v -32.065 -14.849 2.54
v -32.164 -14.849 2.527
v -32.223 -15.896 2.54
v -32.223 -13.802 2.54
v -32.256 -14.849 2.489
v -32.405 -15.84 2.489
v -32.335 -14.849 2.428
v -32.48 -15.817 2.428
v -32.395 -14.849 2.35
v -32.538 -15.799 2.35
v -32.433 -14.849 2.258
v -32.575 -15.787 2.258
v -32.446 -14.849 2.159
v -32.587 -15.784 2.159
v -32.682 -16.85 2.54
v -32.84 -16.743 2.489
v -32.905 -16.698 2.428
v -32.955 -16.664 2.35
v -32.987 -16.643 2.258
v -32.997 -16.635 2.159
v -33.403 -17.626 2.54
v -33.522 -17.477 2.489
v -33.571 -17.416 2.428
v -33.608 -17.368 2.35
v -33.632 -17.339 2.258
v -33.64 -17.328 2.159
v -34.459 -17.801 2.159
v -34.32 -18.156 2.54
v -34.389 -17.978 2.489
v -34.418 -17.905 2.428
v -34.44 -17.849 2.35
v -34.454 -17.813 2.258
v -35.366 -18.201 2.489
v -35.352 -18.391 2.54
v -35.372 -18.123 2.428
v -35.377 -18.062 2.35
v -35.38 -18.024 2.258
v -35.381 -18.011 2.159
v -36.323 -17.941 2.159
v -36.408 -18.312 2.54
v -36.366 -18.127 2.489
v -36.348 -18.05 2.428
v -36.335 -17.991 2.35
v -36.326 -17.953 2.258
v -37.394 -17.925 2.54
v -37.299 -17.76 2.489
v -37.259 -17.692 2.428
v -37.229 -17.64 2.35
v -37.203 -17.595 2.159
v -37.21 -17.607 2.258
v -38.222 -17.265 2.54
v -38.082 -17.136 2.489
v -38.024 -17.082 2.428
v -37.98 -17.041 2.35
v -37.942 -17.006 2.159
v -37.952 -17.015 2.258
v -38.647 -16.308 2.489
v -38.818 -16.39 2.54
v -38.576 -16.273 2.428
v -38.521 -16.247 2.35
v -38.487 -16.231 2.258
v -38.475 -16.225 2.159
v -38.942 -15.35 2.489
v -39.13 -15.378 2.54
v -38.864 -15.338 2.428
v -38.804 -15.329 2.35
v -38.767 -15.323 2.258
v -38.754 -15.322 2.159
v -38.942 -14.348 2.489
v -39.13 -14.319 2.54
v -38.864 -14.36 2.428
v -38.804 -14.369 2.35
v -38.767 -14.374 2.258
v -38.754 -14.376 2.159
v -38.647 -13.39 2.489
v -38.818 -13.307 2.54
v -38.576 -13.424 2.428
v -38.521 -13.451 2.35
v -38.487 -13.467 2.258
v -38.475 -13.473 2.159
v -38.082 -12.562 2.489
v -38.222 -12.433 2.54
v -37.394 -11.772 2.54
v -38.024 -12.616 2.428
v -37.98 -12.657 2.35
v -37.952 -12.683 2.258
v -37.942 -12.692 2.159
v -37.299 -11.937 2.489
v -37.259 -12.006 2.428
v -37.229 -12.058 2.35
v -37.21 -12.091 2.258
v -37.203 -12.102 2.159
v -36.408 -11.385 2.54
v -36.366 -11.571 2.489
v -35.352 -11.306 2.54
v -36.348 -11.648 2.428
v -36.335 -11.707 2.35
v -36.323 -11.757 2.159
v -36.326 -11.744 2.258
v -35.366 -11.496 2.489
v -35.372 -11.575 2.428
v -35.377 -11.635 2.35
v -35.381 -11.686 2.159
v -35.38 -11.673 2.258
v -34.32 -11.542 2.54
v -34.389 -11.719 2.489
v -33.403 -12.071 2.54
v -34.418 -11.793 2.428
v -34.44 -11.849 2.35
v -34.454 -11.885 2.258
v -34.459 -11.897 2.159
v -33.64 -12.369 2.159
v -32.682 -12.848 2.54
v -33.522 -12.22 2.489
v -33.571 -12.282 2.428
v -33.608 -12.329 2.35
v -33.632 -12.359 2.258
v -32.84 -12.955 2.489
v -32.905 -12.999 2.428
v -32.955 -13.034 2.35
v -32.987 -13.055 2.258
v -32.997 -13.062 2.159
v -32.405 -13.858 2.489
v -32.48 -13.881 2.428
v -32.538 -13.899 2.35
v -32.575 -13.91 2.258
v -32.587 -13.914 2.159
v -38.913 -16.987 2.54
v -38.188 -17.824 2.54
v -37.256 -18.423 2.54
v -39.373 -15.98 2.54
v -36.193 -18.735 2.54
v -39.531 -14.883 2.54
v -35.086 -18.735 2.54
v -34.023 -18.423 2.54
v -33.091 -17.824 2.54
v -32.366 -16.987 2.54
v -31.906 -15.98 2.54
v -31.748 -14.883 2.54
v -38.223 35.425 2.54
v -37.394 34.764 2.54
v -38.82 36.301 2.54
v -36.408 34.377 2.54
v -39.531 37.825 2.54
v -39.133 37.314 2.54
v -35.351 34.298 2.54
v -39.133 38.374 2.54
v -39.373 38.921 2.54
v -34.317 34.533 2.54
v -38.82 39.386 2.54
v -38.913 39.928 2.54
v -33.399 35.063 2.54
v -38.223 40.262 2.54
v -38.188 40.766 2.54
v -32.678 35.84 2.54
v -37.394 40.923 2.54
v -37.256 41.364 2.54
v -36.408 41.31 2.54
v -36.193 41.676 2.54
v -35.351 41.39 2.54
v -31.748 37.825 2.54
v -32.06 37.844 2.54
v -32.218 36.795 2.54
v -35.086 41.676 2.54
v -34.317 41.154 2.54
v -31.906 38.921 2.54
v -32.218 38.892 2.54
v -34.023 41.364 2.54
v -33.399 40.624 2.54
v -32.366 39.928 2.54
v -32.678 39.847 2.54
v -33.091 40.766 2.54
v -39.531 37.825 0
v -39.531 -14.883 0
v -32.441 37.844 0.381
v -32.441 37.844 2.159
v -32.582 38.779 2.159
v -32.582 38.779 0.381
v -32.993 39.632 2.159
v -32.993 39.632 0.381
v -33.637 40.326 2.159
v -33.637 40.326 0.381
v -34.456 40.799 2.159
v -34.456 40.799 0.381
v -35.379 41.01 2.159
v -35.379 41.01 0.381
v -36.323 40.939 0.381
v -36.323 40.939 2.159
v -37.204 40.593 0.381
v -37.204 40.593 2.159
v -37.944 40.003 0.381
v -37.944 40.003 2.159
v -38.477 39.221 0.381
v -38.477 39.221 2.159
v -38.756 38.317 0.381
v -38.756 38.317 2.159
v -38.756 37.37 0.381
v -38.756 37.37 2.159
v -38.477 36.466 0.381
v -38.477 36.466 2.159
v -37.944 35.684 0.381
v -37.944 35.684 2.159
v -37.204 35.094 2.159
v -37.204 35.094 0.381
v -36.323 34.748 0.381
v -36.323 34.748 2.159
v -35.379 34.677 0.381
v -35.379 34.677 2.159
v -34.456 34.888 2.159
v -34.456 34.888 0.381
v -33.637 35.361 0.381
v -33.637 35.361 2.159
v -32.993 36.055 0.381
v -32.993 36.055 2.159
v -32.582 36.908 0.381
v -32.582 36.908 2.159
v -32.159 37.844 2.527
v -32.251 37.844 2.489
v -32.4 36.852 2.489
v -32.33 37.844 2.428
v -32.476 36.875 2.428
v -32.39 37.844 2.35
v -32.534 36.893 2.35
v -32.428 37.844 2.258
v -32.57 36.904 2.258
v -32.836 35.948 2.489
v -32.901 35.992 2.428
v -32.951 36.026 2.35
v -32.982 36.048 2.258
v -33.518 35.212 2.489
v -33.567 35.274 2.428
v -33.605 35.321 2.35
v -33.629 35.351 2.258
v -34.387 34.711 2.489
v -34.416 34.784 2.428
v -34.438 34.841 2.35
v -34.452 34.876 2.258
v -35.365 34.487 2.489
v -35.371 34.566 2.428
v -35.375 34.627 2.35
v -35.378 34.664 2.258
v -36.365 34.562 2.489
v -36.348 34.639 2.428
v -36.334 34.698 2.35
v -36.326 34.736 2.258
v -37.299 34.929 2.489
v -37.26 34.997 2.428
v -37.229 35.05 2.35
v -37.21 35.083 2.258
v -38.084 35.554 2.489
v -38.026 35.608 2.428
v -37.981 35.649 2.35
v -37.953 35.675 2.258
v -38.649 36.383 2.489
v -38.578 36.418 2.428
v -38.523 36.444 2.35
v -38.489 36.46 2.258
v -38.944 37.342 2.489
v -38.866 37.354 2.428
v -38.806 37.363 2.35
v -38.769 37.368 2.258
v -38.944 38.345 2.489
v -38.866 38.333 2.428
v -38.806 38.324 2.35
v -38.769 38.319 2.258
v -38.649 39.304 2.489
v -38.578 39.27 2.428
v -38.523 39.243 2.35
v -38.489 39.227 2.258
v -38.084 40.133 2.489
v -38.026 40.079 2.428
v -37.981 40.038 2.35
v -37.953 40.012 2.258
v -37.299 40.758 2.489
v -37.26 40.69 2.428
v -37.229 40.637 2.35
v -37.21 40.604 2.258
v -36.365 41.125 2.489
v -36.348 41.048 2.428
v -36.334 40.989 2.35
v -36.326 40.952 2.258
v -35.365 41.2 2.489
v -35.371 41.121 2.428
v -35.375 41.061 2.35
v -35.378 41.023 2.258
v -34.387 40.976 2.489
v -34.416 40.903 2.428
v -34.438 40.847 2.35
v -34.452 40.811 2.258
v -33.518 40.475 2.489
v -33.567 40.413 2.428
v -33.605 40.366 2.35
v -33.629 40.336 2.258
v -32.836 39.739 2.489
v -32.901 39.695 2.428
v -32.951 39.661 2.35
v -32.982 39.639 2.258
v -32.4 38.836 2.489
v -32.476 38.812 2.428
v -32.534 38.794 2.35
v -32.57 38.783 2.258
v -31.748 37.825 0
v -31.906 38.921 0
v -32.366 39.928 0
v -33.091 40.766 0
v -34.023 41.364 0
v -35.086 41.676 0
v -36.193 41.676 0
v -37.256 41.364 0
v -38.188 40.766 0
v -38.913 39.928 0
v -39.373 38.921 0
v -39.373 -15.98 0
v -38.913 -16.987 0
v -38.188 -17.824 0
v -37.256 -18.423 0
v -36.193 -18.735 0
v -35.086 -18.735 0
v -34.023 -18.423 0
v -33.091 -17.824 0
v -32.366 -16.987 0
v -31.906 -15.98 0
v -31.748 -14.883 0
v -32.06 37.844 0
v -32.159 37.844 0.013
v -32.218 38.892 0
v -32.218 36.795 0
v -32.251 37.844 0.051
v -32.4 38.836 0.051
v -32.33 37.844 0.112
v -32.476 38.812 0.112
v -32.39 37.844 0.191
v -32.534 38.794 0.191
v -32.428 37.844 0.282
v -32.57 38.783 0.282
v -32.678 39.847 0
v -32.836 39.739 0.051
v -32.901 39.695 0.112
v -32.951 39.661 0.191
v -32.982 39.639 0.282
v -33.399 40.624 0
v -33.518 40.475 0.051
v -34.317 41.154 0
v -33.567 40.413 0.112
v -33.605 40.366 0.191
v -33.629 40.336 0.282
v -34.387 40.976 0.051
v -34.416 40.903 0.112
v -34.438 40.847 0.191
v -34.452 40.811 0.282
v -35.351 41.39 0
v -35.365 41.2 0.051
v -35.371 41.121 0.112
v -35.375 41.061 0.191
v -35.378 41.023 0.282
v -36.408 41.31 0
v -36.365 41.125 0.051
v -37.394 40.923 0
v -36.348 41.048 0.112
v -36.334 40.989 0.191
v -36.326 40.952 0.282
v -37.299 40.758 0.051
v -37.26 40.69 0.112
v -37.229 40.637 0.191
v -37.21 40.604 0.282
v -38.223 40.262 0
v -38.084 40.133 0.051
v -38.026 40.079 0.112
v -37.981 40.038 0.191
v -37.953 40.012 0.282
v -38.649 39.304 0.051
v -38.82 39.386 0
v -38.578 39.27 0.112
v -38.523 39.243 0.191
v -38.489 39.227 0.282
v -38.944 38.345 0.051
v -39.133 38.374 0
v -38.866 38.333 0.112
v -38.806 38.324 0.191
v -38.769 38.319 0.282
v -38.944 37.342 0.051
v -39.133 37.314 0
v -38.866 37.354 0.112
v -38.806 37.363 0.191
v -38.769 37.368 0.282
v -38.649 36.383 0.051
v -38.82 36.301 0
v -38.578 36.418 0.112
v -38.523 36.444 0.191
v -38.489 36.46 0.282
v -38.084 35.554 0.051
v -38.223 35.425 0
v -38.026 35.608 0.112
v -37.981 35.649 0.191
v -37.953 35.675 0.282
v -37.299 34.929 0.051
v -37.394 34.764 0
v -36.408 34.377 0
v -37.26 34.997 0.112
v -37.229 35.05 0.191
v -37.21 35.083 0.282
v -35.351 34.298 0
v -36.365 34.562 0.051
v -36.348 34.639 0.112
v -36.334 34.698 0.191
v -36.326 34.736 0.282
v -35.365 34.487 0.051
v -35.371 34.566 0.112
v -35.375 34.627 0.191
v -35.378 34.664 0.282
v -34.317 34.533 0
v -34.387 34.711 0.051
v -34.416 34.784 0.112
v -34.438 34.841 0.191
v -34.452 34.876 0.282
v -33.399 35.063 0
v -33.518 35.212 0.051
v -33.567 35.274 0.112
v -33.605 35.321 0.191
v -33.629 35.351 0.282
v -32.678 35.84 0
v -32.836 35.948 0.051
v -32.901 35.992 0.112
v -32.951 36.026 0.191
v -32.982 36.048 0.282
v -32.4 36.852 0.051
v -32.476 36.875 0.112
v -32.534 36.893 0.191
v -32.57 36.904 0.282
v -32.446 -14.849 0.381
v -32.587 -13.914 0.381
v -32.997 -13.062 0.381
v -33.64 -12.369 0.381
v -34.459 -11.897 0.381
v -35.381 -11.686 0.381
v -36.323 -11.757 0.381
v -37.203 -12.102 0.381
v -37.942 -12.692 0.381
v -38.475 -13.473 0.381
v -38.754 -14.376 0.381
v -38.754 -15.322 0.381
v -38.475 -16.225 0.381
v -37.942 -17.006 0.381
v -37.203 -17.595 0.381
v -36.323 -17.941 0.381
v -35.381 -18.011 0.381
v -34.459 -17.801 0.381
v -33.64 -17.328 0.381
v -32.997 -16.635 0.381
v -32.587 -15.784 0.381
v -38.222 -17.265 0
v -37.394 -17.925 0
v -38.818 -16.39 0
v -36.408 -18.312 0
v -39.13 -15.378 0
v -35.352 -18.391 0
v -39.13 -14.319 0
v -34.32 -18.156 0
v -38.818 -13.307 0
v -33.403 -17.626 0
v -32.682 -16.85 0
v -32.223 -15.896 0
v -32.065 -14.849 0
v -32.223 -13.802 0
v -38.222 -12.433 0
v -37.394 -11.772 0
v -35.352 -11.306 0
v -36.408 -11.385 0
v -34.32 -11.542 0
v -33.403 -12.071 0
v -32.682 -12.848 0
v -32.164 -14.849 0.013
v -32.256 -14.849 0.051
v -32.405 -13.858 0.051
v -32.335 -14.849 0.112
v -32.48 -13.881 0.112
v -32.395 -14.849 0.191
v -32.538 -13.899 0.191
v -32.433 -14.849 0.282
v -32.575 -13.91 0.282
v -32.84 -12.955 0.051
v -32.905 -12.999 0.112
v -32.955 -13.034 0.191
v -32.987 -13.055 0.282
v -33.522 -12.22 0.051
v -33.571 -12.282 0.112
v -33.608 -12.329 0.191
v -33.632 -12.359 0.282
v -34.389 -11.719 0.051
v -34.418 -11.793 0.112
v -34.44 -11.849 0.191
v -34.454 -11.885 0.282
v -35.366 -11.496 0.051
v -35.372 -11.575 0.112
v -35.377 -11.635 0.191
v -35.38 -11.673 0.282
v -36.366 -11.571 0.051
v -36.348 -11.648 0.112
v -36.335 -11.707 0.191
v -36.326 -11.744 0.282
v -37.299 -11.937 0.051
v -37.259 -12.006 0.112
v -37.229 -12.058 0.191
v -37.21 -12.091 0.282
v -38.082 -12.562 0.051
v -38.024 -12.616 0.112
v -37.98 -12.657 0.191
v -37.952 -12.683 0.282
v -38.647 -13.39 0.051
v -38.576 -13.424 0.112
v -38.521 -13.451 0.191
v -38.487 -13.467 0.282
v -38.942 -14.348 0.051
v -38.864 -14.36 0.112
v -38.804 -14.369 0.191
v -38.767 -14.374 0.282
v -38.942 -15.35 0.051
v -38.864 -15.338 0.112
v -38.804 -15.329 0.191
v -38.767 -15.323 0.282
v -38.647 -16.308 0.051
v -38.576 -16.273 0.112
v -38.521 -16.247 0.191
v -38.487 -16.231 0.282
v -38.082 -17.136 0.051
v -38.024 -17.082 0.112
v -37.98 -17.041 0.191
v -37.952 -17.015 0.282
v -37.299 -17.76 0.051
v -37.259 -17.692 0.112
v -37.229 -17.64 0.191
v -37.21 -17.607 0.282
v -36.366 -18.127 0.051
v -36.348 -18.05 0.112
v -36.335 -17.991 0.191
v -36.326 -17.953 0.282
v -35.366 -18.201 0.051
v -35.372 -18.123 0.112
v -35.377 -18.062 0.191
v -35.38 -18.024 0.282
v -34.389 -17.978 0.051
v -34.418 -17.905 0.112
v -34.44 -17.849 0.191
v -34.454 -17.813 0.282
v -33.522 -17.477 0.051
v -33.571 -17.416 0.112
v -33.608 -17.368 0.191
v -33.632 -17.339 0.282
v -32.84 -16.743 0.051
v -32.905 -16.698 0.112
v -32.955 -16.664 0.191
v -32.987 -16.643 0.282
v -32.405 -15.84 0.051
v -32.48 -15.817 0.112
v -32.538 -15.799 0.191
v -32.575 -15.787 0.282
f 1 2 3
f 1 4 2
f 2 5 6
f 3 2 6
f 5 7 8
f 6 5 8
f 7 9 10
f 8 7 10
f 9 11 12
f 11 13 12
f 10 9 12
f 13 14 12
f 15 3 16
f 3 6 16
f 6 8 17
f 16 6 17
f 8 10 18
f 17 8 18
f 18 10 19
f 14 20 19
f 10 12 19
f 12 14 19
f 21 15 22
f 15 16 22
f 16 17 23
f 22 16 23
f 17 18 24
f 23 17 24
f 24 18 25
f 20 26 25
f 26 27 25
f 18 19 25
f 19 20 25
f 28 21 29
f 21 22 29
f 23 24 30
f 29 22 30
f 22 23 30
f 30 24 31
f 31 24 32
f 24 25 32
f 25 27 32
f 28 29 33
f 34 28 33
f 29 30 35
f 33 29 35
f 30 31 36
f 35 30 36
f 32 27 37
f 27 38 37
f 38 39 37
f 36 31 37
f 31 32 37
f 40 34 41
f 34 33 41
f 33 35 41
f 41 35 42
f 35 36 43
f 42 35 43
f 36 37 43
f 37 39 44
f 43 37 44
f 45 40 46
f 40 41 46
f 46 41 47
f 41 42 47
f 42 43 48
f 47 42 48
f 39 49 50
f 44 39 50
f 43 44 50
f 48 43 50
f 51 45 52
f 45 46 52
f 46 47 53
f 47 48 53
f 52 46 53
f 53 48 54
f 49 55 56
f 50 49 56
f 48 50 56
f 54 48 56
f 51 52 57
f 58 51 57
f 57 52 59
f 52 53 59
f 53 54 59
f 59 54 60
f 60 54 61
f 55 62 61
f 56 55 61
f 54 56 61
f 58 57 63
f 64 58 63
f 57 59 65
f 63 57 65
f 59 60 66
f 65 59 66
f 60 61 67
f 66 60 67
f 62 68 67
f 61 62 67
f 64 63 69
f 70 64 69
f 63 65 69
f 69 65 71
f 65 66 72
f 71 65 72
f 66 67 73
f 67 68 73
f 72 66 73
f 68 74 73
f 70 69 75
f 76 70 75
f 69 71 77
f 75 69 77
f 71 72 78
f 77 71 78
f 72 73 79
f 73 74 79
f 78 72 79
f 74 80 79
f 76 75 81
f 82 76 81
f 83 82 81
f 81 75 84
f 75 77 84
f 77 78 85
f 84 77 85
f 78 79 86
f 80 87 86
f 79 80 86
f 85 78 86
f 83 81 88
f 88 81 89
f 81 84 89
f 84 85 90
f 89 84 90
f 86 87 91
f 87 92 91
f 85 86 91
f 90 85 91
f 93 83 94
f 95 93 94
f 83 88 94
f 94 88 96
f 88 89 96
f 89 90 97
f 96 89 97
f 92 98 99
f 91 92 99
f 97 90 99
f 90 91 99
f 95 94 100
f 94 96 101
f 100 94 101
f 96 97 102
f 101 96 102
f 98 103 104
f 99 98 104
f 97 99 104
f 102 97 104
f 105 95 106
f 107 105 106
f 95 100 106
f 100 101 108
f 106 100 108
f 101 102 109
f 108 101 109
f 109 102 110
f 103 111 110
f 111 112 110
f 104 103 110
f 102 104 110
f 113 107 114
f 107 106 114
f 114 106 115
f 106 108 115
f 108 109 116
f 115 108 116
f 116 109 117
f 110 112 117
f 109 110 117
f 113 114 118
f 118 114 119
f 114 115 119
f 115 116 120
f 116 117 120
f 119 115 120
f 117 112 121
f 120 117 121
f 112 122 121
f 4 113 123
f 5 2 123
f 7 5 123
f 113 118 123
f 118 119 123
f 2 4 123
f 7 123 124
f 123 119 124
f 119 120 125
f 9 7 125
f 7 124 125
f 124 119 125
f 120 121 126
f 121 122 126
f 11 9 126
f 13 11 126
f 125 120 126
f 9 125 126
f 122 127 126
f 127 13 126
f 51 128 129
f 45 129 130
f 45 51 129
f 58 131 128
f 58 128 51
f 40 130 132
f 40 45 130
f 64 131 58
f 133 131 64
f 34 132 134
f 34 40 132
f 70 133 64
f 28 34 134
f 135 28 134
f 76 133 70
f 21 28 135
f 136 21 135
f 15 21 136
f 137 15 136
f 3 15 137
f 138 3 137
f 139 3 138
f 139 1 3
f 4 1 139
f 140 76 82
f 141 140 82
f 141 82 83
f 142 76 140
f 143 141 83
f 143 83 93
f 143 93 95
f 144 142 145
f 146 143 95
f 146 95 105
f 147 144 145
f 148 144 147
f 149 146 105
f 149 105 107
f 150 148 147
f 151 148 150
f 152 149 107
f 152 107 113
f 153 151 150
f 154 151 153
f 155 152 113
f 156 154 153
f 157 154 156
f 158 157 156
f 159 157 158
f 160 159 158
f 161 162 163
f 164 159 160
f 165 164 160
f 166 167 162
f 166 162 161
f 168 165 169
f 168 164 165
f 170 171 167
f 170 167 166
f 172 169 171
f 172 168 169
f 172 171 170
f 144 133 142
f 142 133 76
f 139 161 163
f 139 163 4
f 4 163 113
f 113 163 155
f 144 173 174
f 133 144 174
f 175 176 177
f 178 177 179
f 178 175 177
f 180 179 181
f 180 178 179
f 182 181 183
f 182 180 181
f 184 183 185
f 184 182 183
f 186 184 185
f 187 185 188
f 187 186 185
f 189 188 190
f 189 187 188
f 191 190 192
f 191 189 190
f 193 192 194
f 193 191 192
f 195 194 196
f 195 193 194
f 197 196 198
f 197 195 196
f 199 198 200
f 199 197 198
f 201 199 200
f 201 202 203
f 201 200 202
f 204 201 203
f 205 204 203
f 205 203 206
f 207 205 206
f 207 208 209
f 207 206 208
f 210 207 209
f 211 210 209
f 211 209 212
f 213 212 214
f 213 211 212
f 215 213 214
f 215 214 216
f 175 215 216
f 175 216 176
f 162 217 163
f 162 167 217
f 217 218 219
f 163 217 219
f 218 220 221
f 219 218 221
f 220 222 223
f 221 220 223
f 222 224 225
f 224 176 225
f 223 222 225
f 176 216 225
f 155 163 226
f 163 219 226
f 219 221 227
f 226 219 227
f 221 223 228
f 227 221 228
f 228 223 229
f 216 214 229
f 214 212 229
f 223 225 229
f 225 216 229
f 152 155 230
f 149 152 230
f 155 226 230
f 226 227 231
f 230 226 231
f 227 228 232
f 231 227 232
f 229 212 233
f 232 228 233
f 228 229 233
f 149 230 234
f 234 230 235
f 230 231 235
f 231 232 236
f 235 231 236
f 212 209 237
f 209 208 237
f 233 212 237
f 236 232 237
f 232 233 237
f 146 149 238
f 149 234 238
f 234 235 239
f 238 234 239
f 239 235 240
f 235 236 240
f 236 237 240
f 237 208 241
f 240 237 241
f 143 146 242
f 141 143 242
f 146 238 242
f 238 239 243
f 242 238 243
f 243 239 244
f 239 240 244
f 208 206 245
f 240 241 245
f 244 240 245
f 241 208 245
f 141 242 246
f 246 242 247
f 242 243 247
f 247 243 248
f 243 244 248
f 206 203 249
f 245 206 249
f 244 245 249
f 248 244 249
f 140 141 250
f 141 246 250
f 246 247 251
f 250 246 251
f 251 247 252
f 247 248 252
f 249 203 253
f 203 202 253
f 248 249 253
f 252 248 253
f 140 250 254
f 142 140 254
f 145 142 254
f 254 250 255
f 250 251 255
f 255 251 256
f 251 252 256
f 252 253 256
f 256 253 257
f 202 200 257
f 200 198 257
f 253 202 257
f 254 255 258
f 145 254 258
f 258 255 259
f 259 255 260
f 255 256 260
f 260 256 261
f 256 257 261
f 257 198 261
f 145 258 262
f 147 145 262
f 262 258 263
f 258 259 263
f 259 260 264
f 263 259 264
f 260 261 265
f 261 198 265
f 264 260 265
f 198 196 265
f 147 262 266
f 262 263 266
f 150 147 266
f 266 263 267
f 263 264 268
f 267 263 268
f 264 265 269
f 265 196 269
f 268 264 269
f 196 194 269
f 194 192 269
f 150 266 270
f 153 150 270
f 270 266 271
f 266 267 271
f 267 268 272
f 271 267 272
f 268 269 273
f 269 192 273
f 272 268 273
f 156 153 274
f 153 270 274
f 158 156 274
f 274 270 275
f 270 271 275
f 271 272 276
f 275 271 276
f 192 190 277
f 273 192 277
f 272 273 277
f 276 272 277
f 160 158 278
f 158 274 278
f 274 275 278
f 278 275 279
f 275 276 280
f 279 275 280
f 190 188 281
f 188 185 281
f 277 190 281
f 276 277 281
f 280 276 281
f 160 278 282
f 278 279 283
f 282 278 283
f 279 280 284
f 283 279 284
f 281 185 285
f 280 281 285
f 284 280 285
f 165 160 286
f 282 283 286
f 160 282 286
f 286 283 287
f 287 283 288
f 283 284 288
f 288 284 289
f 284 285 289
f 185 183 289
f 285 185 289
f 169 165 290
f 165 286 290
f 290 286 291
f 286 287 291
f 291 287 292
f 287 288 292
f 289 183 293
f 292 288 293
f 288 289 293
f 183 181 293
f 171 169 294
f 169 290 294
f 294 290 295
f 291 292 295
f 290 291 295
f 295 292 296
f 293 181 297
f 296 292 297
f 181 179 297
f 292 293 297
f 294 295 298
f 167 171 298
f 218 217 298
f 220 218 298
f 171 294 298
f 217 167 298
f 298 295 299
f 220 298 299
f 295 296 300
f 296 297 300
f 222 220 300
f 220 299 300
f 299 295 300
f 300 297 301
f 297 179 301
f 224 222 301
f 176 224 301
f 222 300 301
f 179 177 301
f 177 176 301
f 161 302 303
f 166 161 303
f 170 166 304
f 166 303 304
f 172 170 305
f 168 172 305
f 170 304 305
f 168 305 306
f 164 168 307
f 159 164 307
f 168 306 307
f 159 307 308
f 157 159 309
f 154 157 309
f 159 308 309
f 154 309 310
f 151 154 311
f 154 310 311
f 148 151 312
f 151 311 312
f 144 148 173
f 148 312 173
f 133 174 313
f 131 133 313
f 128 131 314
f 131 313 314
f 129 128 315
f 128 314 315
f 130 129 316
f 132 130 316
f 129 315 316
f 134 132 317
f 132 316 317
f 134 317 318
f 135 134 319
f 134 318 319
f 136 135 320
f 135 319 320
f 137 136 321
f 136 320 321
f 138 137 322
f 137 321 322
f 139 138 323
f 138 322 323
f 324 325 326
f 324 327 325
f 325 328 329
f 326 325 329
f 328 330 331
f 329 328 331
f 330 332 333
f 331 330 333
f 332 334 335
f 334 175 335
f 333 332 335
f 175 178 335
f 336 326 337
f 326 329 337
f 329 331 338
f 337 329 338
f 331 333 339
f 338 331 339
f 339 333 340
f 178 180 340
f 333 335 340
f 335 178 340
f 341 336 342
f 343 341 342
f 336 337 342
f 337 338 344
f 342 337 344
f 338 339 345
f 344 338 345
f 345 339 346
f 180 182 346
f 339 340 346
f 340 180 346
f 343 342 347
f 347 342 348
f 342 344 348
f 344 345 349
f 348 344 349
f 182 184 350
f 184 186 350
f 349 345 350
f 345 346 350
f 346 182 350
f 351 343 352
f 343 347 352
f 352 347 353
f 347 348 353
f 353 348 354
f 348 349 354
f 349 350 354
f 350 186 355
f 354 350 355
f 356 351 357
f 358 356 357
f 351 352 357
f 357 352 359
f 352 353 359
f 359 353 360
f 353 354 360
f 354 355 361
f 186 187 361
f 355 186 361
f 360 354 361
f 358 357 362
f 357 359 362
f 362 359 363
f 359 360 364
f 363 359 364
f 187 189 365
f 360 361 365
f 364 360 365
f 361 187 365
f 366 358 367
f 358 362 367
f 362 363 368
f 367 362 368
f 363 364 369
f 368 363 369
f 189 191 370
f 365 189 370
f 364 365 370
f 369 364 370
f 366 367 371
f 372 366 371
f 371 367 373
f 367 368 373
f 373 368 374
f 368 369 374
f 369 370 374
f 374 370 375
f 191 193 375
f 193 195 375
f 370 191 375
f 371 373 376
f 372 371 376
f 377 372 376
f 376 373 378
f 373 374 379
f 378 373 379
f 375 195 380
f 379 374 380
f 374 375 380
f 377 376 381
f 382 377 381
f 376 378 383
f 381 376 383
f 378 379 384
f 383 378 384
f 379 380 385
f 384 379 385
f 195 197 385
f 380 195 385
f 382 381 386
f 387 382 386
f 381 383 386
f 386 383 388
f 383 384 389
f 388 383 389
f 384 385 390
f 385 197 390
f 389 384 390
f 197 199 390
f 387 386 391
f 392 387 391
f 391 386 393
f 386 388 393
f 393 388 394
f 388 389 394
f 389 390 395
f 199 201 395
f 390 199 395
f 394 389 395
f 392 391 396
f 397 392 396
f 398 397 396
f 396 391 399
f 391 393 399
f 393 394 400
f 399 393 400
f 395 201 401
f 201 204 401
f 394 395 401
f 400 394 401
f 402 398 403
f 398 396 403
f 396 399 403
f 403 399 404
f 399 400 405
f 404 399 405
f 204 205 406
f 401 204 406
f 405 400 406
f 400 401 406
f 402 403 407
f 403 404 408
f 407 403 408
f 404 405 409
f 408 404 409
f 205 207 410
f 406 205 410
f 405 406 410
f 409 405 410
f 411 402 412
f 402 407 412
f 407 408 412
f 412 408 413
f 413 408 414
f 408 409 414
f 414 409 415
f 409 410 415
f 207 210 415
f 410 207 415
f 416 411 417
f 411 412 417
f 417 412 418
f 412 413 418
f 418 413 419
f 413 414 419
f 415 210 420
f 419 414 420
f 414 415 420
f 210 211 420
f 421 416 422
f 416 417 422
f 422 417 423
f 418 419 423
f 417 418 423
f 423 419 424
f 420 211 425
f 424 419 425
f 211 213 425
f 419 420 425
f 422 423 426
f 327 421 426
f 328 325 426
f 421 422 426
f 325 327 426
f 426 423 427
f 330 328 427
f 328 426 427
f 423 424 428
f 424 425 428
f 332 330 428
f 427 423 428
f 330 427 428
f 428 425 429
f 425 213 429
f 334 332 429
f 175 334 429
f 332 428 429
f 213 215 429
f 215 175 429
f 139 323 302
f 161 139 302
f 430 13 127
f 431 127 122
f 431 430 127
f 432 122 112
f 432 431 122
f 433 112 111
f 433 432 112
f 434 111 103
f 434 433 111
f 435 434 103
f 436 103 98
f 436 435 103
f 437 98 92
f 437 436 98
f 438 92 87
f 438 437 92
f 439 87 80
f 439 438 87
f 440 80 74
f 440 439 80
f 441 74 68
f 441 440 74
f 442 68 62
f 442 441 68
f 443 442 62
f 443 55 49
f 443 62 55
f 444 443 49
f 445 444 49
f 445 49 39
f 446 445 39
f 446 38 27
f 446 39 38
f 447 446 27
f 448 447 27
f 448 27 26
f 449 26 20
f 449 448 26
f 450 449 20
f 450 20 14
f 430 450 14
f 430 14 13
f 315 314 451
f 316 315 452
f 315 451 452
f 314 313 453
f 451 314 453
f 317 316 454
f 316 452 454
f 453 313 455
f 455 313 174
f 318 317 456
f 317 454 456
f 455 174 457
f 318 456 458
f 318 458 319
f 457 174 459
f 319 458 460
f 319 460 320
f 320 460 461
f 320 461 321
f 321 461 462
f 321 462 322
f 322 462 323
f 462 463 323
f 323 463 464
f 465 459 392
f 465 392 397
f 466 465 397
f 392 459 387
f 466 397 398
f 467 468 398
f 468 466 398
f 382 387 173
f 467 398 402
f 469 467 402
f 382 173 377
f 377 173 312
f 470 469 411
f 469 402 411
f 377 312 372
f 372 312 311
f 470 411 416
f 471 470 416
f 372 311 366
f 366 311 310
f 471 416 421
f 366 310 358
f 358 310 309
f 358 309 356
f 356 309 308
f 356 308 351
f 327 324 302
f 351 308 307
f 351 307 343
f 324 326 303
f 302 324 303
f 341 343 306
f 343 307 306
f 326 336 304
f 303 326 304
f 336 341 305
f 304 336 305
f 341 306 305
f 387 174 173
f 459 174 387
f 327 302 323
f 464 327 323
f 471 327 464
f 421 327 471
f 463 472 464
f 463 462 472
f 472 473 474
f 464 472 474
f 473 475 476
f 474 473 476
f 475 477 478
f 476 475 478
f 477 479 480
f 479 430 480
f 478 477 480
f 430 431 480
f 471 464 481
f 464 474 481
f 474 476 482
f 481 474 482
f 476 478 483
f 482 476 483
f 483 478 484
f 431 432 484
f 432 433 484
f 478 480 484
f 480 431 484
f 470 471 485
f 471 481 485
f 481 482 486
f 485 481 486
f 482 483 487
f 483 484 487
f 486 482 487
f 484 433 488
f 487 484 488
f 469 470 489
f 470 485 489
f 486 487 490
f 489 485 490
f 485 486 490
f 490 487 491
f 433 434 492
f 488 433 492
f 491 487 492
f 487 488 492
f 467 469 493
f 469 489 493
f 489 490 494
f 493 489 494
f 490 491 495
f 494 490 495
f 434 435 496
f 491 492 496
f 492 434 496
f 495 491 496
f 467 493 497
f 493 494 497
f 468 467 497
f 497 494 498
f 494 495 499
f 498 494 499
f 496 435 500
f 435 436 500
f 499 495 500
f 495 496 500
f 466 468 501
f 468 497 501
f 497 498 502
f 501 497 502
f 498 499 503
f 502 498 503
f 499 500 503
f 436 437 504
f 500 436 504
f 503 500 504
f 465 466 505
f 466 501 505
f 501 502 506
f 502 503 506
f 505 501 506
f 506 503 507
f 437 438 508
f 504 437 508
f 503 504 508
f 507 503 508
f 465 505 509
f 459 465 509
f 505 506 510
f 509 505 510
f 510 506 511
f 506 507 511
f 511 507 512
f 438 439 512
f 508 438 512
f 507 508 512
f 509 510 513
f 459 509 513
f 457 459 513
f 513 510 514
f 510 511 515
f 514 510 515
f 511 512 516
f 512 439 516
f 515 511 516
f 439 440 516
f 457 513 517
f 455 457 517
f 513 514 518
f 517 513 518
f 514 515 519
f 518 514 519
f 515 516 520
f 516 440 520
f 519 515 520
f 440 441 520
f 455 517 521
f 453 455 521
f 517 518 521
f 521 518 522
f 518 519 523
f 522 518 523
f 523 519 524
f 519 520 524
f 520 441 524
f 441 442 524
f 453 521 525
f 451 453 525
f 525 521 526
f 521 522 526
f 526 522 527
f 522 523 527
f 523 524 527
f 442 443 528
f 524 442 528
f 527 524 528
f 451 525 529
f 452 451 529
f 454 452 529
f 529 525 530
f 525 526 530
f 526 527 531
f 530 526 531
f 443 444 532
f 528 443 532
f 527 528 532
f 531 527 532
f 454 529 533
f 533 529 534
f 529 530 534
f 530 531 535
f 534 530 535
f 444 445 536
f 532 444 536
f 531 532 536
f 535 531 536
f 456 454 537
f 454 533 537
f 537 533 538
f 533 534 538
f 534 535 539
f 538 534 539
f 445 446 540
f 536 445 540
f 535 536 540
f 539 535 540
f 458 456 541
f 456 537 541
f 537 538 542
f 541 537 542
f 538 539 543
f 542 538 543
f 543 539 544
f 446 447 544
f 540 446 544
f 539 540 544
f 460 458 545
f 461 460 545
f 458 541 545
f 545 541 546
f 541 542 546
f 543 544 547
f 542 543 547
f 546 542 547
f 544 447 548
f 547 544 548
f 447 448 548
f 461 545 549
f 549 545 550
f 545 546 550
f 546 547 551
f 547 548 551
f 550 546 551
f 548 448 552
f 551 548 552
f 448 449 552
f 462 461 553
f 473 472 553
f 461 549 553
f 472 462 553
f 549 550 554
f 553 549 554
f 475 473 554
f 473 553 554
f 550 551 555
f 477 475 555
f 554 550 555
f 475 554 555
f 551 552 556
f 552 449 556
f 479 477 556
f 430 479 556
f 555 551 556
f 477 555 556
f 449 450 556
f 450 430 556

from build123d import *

# Parameters (mm, degrees)
F1_DEPTH = 2.54
F2_R     = 3.175
F2_R_2   = 3.171459
F3_DEPTH = 3.81
F4_R     = 0.381


with BuildPart() as f1:
    # F0 (on Top) → F1 (new body)
    with BuildSketch(Plane.XY):
        with BuildLine():
            ThreePointArc((-31.748279, 37.824634), (-35.639643, 41.715999), (-39.531007, 37.824634))
            Line((-39.531007, 37.824634), (-39.531007, -14.883377))
            ThreePointArc((-39.531007, -14.883377), (-35.639643, -18.774741), (-31.748279, -14.883377))
            Line((-31.748279, -14.883377), (-31.748279, 37.824634))
        make_face()
    extrude(amount=F1_DEPTH)

    # F2 (on Top) → F3 (cut)
    with BuildSketch(Plane.XY):
        with Locations((-35.616416, 37.843566)):
            Circle(F2_R)
        with Locations((-35.617653, -14.84884)):
            Circle(F2_R_2)
    extrude(amount=F3_DEPTH, mode=Mode.SUBTRACT)

    # F4
    f4_edges = [f1.edges().sort_by_distance(p)[0] for p in [
        (-38.791416, 37.843566, 2.54),
        (-38.791416, 37.843566, 0),
        (-38.789113, -14.84884, 2.54),
        (-38.789113, -14.84884, 0),
    ]]
    fillet(f4_edges, radius=F4_R)


solid = f1.part
